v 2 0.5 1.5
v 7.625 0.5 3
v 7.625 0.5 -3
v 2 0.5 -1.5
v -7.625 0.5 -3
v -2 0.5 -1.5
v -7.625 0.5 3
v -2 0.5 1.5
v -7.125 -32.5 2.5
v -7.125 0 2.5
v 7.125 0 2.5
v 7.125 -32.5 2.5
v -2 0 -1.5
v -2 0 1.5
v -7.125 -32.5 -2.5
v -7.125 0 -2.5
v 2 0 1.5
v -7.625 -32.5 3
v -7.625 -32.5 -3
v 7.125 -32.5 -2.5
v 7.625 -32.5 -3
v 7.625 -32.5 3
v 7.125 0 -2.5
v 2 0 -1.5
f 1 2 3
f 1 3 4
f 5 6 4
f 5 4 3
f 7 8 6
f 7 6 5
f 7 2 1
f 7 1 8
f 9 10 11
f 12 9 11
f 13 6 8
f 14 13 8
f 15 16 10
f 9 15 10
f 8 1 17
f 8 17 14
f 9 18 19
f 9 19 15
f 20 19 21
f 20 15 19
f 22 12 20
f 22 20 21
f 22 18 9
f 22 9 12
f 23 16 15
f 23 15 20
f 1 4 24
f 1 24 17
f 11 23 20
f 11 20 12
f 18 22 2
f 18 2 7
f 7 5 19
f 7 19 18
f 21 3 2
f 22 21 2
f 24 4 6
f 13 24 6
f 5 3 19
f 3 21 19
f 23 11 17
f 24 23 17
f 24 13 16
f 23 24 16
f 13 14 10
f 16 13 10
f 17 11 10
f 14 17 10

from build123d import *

# Parameters (mm, degrees)
F0_W     = 15.25
F0_H     = 6
F0_W_2   = 14.25
F0_H_2   = 5
F1_DEPTH = 32.5
F2_W     = 15.25
F2_H     = 6
F3_DEPTH = 0.5
F4_W     = 4
F4_H     = 3
F5_DEPTH = 33.001


with BuildPart() as f1:
    # F0 (on Front) → F1 (new body)
    with BuildSketch(Plane.XZ):
        Rectangle(F0_W, F0_H)
        Rectangle(F0_W_2, F0_H_2, mode=Mode.SUBTRACT)
    extrude(amount=F1_DEPTH)

    # F2 (on face) → F3 (join)
    with BuildSketch(Plane(origin=(0, 0, 0), x_dir=(-1, 0, 0), z_dir=(0, 1, 0))):
        Rectangle(F2_W, F2_H)
    extrude(amount=F3_DEPTH)

    # F4 (on face) → F5 (cut, through all)
    with BuildSketch(Plane(origin=(0, 0.5, 0), x_dir=(-1, 0, 0), z_dir=(0, 1, 0))):
        Rectangle(F4_W, F4_H)
    extrude(amount=-F5_DEPTH, mode=Mode.SUBTRACT)


solid = f1.part
